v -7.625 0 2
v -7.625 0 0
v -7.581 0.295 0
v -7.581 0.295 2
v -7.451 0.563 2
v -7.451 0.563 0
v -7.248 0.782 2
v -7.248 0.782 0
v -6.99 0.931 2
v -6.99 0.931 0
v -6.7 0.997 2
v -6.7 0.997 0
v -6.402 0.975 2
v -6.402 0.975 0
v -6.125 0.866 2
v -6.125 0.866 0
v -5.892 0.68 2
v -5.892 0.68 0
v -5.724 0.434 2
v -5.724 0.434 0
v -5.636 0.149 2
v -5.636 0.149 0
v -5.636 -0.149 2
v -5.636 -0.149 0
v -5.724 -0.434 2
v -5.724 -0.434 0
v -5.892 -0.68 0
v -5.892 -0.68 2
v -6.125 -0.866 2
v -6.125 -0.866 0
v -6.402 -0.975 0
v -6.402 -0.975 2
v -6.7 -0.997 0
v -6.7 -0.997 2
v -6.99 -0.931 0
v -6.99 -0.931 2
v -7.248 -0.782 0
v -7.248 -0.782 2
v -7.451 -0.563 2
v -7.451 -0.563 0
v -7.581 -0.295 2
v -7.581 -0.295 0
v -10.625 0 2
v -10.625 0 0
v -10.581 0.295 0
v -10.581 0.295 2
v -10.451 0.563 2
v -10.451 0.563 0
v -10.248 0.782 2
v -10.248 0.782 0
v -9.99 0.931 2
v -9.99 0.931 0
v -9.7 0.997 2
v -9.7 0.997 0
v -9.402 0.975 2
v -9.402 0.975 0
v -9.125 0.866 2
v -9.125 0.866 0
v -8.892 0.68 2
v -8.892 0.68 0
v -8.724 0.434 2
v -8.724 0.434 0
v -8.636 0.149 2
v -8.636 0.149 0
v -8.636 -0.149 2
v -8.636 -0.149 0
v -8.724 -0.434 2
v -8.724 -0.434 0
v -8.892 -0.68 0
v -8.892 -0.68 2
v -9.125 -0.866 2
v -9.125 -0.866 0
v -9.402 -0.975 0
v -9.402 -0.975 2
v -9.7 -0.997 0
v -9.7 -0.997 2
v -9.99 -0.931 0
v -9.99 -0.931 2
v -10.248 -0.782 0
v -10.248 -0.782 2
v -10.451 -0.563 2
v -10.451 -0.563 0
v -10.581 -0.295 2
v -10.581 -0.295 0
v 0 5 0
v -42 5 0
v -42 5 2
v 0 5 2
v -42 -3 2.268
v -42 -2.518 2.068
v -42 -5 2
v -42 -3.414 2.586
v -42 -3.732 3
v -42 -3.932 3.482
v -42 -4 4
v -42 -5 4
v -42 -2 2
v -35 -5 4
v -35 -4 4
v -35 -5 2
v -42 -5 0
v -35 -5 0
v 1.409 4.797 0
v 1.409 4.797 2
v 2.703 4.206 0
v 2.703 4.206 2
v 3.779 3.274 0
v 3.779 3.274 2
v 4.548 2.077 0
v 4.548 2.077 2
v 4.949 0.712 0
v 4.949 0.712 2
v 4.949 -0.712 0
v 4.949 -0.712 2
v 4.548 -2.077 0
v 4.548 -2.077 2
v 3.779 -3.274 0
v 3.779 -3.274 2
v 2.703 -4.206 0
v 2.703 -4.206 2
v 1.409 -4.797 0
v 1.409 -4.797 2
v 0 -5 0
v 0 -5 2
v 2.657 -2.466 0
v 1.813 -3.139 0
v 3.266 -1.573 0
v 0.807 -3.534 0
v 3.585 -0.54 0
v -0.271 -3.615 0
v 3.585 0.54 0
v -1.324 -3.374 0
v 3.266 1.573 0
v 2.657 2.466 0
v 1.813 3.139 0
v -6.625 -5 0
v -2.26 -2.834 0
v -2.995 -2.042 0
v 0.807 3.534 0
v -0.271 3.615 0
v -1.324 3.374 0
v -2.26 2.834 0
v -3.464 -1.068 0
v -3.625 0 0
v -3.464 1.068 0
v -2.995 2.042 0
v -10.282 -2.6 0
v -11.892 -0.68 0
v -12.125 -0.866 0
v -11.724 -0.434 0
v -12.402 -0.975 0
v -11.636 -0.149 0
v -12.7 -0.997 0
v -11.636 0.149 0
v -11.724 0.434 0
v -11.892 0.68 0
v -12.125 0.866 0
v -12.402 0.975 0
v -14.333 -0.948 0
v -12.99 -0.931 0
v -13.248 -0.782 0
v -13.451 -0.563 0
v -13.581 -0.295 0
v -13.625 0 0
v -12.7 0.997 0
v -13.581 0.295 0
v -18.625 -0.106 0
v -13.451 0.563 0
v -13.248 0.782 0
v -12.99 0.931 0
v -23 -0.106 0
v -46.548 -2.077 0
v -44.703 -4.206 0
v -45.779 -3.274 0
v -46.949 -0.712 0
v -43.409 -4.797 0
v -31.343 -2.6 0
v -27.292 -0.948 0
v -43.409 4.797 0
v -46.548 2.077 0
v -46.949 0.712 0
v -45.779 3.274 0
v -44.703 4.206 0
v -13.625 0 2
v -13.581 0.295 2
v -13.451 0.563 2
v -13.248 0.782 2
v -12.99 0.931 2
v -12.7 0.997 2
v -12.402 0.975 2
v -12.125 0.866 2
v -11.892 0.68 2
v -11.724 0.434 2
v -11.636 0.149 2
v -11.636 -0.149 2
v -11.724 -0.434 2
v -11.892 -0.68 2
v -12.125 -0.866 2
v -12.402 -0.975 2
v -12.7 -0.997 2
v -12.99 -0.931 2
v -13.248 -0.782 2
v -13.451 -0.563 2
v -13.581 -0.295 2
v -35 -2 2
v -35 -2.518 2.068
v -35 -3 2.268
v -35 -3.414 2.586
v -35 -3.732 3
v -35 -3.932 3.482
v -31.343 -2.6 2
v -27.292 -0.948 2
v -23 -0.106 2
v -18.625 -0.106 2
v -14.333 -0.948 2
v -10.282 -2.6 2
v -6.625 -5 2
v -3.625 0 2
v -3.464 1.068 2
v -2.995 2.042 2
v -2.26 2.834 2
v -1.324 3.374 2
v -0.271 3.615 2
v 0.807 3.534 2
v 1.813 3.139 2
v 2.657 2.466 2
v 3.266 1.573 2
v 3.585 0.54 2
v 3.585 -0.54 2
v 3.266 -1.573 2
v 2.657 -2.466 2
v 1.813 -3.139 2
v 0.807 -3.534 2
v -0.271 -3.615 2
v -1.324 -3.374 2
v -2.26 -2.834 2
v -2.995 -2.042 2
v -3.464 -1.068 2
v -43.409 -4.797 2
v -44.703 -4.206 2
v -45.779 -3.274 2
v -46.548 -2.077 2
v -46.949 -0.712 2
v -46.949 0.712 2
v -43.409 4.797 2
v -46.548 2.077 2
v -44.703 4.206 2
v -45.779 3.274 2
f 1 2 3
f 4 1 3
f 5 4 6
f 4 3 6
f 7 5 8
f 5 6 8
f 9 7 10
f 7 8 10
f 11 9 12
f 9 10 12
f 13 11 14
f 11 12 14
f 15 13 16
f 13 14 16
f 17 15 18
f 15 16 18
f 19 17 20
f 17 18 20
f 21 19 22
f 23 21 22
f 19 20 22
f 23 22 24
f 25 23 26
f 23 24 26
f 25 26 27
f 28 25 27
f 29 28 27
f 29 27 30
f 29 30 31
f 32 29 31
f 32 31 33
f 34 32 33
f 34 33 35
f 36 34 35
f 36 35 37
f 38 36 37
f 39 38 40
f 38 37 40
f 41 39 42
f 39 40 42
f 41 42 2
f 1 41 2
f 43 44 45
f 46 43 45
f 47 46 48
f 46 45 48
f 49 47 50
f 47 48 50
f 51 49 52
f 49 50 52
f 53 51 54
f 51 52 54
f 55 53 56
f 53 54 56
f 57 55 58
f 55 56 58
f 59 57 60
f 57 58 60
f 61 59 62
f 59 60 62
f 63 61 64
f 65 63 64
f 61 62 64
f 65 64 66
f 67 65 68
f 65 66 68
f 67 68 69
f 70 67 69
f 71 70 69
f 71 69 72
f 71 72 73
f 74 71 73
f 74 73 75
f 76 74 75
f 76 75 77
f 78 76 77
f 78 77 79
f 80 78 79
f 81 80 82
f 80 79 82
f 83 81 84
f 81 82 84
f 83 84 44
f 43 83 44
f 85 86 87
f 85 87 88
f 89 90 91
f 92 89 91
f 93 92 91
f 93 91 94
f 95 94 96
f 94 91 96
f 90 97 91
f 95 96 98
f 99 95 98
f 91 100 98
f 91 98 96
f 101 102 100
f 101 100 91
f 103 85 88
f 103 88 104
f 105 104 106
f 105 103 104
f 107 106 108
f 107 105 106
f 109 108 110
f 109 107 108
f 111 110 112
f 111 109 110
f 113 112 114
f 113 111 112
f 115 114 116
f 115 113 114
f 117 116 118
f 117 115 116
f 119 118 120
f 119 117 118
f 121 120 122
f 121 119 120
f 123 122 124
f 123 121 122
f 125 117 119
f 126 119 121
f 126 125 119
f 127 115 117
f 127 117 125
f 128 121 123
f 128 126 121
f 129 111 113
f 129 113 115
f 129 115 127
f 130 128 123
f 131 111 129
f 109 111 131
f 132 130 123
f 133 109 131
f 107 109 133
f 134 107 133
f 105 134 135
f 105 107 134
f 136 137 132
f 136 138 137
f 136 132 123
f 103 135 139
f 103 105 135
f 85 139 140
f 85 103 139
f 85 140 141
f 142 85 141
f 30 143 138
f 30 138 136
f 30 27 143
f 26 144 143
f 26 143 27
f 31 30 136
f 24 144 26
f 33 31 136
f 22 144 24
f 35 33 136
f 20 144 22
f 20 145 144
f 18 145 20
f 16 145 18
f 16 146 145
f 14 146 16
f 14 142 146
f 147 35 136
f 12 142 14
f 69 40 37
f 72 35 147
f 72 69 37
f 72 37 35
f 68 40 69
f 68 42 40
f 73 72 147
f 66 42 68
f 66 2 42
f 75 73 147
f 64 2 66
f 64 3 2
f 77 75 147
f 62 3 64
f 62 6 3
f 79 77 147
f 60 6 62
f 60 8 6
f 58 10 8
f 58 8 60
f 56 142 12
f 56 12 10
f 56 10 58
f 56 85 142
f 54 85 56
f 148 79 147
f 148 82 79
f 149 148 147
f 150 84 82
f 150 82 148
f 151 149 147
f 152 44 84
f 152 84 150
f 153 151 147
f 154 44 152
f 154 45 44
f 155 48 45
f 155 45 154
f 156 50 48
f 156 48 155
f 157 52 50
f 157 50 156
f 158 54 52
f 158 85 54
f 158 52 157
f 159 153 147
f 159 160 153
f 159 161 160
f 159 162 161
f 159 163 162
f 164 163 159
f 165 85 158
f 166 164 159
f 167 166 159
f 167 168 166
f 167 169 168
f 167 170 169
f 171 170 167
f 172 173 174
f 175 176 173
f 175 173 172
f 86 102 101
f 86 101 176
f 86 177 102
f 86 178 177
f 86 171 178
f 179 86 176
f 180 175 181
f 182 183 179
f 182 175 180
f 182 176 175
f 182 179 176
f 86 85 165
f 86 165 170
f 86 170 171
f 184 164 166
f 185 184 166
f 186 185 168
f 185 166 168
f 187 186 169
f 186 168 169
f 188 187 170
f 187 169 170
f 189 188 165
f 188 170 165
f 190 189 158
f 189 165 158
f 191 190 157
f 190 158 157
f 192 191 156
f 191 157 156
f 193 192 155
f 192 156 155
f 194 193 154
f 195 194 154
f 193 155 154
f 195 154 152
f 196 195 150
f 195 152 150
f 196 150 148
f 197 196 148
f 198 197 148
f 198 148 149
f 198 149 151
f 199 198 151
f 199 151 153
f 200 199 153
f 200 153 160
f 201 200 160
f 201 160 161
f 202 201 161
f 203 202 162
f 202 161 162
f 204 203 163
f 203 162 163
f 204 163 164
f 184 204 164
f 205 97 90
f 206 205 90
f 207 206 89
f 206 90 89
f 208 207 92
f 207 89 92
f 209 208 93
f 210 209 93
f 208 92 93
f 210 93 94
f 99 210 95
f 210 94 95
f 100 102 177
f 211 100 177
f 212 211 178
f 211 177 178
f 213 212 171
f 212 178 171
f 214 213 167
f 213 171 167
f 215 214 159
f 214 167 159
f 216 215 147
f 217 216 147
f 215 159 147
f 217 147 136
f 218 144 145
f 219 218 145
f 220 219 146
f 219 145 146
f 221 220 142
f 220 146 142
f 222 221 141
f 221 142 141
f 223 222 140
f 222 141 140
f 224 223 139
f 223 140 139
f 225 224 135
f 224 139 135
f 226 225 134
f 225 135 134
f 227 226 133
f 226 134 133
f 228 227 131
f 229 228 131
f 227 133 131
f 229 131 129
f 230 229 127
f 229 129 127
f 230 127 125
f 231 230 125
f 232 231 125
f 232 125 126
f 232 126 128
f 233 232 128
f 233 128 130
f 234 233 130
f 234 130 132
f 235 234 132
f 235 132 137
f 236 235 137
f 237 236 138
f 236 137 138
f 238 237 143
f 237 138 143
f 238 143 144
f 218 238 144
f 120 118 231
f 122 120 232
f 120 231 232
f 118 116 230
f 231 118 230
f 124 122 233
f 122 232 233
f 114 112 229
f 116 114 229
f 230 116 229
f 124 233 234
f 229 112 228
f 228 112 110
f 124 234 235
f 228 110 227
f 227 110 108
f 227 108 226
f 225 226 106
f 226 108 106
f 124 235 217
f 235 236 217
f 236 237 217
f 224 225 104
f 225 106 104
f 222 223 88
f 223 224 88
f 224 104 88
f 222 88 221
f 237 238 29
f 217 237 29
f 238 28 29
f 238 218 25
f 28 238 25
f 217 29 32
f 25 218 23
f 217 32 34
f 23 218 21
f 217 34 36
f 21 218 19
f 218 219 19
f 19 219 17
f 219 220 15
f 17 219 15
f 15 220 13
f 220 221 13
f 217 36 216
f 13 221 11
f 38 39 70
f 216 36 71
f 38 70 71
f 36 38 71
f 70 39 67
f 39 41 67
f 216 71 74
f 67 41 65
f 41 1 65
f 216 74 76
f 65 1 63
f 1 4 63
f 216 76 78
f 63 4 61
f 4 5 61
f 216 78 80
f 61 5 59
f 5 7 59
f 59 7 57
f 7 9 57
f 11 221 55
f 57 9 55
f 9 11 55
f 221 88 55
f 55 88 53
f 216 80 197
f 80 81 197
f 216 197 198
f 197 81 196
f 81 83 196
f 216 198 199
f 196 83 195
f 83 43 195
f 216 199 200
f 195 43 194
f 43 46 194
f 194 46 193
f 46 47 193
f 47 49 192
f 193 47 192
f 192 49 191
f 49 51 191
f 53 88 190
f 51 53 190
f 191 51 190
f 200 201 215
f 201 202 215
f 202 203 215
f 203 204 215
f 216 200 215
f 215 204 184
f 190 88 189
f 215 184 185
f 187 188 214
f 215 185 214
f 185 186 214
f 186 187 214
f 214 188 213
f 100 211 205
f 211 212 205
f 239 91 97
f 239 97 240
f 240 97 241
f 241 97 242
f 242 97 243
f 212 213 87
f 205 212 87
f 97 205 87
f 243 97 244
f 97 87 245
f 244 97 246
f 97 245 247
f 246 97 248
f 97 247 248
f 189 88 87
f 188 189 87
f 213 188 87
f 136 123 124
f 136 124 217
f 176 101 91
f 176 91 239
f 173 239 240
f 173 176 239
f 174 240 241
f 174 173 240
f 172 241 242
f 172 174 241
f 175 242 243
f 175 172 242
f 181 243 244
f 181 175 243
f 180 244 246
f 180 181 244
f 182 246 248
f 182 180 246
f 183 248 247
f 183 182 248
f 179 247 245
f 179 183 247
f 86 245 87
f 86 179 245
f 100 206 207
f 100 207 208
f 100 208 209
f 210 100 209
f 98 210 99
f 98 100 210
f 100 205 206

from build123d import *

# Parameters (mm, degrees)
BOSS_EXTRUDE1_DEPTH = 2
SKETCH3_R           = 3.625
SKETCH3_R_2         = 1
CUT_EXTRUDE1_DEPTH  = 2
SKETCH4_W           = 7
SKETCH4_H           = 4
BOSS_EXTRUDE2_DEPTH = 3
SKETCH7_R           = 2
CUT_EXTRUDE2_DEPTH  = 7


with BuildPart() as part:
    # Sketch1 → Boss-Extrude1 (new body)
    with BuildSketch(Plane.XY):
        with BuildLine():
            Line((-42, 5), (0, 5))
            ThreePointArc((0, 5), (5, 0), (0, -5))
            Line((0, -5), (-42, -5))
            ThreePointArc((-42, -5), (-47, 0), (-42, 5))
        make_face()
    extrude(amount=BOSS_EXTRUDE1_DEPTH)

    # Sketch3 → Cut-Extrude1 (cut)
    with BuildSketch(Plane(origin=(0, 0, 0), x_dir=(-1, 0, 0), z_dir=(0, 0, -1))):
        with BuildLine():
            Line((6.625, -5), (35, -5))
            ThreePointArc((35, -5), (20.8125, 0), (6.625, -5))
        make_face()
        Circle(SKETCH3_R)
        with Locations((6.625, 0)):
            Circle(SKETCH3_R_2)
        with Locations((9.625, 0)):
            Circle(SKETCH3_R_2)
        with Locations((12.625, 0)):
            Circle(SKETCH3_R_2)
    extrude(amount=-CUT_EXTRUDE1_DEPTH, mode=Mode.SUBTRACT)

    # Sketch4 → Boss-Extrude2 (add)
    with BuildSketch(Plane.XZ.offset(5)):
        with Locations((-38.5, 2)):
            Rectangle(SKETCH4_W, SKETCH4_H)
    extrude(amount=-BOSS_EXTRUDE2_DEPTH)

    # Sketch7 → Cut-Extrude2 (cut)
    with BuildSketch(Plane.ZY.offset(42)):
        with Locations((4, -2)):
            Circle(SKETCH7_R)
    extrude(amount=-CUT_EXTRUDE2_DEPTH, mode=Mode.SUBTRACT)


solid = part.part
